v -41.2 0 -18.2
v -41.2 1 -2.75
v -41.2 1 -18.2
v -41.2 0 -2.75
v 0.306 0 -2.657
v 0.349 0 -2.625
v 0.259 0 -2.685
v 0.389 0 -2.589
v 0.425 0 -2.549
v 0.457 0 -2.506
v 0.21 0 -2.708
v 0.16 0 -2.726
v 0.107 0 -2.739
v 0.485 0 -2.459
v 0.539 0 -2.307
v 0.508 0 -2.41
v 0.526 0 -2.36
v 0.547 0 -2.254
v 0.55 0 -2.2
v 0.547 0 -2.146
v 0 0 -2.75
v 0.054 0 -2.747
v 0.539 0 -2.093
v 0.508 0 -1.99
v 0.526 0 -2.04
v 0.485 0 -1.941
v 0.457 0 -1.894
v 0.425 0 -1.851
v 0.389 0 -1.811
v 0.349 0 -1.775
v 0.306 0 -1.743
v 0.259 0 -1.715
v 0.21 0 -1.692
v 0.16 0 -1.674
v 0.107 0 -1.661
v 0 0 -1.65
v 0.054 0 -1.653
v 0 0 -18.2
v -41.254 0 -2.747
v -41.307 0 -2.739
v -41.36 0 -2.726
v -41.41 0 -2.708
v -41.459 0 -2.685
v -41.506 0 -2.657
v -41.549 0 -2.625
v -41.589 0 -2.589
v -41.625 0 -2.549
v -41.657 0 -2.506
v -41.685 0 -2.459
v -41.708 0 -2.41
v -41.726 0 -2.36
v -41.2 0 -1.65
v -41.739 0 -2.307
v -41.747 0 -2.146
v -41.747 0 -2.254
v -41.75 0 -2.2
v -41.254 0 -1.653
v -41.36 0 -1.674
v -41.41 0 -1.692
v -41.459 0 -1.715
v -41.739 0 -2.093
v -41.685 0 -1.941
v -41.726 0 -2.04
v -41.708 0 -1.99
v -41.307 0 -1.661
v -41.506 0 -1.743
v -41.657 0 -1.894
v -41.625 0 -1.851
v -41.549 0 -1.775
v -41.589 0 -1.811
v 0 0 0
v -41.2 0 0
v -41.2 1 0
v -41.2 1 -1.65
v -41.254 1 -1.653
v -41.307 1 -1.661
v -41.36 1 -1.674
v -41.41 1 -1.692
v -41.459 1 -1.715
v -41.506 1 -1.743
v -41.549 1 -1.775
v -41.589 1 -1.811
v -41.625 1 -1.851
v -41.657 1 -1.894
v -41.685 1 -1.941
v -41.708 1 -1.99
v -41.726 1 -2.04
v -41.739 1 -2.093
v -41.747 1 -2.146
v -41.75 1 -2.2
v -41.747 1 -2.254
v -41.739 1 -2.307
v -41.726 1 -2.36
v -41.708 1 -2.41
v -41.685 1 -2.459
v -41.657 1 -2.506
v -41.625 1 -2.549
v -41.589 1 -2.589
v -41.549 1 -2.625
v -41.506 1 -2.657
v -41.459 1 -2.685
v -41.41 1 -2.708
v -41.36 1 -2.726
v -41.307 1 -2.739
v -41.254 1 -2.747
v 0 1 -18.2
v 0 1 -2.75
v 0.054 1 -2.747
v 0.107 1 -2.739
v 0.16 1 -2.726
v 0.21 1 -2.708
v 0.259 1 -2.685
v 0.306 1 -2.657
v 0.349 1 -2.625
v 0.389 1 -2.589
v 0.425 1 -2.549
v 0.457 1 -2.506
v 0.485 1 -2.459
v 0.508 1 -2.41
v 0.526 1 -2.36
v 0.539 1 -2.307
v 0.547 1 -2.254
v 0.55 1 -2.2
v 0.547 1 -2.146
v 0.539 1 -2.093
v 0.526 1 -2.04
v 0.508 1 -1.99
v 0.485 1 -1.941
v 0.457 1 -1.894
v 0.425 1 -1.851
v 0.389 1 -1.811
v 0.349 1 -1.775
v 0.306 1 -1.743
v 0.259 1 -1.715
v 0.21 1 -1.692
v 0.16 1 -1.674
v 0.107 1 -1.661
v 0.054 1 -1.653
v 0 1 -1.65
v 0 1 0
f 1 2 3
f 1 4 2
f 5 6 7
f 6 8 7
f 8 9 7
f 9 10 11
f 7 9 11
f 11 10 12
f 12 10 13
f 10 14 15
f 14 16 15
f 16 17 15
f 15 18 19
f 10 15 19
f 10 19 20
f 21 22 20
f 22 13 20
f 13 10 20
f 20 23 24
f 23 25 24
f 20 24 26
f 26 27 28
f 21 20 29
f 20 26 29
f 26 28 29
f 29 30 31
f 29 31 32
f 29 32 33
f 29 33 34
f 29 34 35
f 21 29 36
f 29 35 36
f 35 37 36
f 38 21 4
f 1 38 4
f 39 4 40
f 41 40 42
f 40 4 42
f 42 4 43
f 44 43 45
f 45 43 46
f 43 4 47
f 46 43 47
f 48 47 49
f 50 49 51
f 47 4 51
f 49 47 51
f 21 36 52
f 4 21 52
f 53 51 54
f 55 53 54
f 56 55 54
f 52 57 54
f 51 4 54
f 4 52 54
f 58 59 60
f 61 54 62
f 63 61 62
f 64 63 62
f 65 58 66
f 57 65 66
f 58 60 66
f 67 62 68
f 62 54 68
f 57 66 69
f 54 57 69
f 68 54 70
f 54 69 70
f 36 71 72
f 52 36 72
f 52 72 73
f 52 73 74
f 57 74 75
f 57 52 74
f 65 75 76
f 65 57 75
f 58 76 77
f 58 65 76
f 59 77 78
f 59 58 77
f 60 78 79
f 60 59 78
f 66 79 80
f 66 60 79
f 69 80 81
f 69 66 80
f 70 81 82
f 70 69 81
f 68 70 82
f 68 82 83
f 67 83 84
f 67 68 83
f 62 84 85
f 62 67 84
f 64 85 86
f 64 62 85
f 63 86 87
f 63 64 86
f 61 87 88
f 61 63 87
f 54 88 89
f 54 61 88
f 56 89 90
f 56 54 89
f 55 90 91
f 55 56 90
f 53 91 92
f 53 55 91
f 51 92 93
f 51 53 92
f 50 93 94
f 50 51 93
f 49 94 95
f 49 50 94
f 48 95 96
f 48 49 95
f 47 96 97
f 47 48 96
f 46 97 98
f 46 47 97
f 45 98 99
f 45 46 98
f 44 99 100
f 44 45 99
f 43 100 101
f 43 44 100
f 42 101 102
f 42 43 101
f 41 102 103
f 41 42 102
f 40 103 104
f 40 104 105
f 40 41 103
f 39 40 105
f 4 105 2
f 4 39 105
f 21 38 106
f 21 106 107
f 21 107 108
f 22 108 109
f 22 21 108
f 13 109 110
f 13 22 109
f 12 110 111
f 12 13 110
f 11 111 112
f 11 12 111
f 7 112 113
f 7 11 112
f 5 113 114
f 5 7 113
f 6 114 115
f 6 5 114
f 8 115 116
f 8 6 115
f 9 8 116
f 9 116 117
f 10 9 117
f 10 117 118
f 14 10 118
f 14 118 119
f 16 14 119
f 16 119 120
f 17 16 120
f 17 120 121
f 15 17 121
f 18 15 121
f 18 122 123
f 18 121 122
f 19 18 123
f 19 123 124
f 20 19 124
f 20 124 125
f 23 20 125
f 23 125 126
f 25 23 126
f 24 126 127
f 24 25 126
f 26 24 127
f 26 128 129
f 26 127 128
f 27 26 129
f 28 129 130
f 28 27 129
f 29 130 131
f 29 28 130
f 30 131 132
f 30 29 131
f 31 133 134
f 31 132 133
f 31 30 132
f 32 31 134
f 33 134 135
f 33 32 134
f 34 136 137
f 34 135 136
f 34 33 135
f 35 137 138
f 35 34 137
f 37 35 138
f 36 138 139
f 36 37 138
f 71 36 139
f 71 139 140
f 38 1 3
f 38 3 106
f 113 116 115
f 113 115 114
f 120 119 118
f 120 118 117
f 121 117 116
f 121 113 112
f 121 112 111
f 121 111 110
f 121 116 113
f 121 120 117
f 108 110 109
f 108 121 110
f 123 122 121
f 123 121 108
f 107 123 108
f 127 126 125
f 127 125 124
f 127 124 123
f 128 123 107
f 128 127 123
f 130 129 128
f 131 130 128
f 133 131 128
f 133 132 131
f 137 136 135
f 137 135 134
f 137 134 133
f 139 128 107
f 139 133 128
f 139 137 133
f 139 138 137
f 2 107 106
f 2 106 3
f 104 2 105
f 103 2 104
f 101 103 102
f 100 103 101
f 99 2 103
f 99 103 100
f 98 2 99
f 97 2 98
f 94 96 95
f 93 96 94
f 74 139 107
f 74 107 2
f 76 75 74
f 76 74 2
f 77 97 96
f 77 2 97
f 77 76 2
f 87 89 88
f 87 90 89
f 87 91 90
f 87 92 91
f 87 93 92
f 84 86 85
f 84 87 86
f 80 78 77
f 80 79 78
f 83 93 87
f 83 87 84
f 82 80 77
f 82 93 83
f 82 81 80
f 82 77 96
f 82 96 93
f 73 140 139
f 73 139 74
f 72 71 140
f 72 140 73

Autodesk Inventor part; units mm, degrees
ref_plane "YZ Plane" through (0, 0, 0) normal (1, 0, 0) x (0, 1, 0)
ref_plane "XZ Plane" through (0, 0, 0) normal (0, 1, 0) x (-1, 0, 0)
ref_plane "XY Plane" through (0, 0, 0) normal (0, 0, 1) x (1, 0, 0)
sketch "スケッチ1" plane through (0, 0, 0) normal (0, 1, 0) x (-1, 0, 0)
  line L0 (0, 0) -> (41.2, 0)
  line L1 (41.2, 0) -> (41.2, -18.2)
  line L2 (41.2, -18.2) -> (0, -18.2)
  line L3 (0, -18.2) -> (0, 0)
  dimension "d0" = 41.2
  dimension "d1" = 18.2
extrude "押し出し1" add sketch "スケッチ1" along normal blind 1
sketch "スケッチ2" plane through (0, 0, 0) normal (0, -1, 0) x (1, 0, 0)
  line L0 (0, 0) -> (0, -18.2) projected
  circle A0 centre (0, -2.2) radius 0.55
  line L1 (-41.2, -18.2) -> (-41.2, 0) projected
  circle A1 centre (-41.2, -2.2) radius 0.55
  line L2 (-41.2, 0) -> (0, 0) projected
  dimension "d4" = 1.1
  dimension "d5" = 1.1
  dimension "d6" = 2.2
extrude "押し出し2" add sketch "スケッチ2" against normal up to surface (1 mm away)
properties part number "battery_case_cover"
